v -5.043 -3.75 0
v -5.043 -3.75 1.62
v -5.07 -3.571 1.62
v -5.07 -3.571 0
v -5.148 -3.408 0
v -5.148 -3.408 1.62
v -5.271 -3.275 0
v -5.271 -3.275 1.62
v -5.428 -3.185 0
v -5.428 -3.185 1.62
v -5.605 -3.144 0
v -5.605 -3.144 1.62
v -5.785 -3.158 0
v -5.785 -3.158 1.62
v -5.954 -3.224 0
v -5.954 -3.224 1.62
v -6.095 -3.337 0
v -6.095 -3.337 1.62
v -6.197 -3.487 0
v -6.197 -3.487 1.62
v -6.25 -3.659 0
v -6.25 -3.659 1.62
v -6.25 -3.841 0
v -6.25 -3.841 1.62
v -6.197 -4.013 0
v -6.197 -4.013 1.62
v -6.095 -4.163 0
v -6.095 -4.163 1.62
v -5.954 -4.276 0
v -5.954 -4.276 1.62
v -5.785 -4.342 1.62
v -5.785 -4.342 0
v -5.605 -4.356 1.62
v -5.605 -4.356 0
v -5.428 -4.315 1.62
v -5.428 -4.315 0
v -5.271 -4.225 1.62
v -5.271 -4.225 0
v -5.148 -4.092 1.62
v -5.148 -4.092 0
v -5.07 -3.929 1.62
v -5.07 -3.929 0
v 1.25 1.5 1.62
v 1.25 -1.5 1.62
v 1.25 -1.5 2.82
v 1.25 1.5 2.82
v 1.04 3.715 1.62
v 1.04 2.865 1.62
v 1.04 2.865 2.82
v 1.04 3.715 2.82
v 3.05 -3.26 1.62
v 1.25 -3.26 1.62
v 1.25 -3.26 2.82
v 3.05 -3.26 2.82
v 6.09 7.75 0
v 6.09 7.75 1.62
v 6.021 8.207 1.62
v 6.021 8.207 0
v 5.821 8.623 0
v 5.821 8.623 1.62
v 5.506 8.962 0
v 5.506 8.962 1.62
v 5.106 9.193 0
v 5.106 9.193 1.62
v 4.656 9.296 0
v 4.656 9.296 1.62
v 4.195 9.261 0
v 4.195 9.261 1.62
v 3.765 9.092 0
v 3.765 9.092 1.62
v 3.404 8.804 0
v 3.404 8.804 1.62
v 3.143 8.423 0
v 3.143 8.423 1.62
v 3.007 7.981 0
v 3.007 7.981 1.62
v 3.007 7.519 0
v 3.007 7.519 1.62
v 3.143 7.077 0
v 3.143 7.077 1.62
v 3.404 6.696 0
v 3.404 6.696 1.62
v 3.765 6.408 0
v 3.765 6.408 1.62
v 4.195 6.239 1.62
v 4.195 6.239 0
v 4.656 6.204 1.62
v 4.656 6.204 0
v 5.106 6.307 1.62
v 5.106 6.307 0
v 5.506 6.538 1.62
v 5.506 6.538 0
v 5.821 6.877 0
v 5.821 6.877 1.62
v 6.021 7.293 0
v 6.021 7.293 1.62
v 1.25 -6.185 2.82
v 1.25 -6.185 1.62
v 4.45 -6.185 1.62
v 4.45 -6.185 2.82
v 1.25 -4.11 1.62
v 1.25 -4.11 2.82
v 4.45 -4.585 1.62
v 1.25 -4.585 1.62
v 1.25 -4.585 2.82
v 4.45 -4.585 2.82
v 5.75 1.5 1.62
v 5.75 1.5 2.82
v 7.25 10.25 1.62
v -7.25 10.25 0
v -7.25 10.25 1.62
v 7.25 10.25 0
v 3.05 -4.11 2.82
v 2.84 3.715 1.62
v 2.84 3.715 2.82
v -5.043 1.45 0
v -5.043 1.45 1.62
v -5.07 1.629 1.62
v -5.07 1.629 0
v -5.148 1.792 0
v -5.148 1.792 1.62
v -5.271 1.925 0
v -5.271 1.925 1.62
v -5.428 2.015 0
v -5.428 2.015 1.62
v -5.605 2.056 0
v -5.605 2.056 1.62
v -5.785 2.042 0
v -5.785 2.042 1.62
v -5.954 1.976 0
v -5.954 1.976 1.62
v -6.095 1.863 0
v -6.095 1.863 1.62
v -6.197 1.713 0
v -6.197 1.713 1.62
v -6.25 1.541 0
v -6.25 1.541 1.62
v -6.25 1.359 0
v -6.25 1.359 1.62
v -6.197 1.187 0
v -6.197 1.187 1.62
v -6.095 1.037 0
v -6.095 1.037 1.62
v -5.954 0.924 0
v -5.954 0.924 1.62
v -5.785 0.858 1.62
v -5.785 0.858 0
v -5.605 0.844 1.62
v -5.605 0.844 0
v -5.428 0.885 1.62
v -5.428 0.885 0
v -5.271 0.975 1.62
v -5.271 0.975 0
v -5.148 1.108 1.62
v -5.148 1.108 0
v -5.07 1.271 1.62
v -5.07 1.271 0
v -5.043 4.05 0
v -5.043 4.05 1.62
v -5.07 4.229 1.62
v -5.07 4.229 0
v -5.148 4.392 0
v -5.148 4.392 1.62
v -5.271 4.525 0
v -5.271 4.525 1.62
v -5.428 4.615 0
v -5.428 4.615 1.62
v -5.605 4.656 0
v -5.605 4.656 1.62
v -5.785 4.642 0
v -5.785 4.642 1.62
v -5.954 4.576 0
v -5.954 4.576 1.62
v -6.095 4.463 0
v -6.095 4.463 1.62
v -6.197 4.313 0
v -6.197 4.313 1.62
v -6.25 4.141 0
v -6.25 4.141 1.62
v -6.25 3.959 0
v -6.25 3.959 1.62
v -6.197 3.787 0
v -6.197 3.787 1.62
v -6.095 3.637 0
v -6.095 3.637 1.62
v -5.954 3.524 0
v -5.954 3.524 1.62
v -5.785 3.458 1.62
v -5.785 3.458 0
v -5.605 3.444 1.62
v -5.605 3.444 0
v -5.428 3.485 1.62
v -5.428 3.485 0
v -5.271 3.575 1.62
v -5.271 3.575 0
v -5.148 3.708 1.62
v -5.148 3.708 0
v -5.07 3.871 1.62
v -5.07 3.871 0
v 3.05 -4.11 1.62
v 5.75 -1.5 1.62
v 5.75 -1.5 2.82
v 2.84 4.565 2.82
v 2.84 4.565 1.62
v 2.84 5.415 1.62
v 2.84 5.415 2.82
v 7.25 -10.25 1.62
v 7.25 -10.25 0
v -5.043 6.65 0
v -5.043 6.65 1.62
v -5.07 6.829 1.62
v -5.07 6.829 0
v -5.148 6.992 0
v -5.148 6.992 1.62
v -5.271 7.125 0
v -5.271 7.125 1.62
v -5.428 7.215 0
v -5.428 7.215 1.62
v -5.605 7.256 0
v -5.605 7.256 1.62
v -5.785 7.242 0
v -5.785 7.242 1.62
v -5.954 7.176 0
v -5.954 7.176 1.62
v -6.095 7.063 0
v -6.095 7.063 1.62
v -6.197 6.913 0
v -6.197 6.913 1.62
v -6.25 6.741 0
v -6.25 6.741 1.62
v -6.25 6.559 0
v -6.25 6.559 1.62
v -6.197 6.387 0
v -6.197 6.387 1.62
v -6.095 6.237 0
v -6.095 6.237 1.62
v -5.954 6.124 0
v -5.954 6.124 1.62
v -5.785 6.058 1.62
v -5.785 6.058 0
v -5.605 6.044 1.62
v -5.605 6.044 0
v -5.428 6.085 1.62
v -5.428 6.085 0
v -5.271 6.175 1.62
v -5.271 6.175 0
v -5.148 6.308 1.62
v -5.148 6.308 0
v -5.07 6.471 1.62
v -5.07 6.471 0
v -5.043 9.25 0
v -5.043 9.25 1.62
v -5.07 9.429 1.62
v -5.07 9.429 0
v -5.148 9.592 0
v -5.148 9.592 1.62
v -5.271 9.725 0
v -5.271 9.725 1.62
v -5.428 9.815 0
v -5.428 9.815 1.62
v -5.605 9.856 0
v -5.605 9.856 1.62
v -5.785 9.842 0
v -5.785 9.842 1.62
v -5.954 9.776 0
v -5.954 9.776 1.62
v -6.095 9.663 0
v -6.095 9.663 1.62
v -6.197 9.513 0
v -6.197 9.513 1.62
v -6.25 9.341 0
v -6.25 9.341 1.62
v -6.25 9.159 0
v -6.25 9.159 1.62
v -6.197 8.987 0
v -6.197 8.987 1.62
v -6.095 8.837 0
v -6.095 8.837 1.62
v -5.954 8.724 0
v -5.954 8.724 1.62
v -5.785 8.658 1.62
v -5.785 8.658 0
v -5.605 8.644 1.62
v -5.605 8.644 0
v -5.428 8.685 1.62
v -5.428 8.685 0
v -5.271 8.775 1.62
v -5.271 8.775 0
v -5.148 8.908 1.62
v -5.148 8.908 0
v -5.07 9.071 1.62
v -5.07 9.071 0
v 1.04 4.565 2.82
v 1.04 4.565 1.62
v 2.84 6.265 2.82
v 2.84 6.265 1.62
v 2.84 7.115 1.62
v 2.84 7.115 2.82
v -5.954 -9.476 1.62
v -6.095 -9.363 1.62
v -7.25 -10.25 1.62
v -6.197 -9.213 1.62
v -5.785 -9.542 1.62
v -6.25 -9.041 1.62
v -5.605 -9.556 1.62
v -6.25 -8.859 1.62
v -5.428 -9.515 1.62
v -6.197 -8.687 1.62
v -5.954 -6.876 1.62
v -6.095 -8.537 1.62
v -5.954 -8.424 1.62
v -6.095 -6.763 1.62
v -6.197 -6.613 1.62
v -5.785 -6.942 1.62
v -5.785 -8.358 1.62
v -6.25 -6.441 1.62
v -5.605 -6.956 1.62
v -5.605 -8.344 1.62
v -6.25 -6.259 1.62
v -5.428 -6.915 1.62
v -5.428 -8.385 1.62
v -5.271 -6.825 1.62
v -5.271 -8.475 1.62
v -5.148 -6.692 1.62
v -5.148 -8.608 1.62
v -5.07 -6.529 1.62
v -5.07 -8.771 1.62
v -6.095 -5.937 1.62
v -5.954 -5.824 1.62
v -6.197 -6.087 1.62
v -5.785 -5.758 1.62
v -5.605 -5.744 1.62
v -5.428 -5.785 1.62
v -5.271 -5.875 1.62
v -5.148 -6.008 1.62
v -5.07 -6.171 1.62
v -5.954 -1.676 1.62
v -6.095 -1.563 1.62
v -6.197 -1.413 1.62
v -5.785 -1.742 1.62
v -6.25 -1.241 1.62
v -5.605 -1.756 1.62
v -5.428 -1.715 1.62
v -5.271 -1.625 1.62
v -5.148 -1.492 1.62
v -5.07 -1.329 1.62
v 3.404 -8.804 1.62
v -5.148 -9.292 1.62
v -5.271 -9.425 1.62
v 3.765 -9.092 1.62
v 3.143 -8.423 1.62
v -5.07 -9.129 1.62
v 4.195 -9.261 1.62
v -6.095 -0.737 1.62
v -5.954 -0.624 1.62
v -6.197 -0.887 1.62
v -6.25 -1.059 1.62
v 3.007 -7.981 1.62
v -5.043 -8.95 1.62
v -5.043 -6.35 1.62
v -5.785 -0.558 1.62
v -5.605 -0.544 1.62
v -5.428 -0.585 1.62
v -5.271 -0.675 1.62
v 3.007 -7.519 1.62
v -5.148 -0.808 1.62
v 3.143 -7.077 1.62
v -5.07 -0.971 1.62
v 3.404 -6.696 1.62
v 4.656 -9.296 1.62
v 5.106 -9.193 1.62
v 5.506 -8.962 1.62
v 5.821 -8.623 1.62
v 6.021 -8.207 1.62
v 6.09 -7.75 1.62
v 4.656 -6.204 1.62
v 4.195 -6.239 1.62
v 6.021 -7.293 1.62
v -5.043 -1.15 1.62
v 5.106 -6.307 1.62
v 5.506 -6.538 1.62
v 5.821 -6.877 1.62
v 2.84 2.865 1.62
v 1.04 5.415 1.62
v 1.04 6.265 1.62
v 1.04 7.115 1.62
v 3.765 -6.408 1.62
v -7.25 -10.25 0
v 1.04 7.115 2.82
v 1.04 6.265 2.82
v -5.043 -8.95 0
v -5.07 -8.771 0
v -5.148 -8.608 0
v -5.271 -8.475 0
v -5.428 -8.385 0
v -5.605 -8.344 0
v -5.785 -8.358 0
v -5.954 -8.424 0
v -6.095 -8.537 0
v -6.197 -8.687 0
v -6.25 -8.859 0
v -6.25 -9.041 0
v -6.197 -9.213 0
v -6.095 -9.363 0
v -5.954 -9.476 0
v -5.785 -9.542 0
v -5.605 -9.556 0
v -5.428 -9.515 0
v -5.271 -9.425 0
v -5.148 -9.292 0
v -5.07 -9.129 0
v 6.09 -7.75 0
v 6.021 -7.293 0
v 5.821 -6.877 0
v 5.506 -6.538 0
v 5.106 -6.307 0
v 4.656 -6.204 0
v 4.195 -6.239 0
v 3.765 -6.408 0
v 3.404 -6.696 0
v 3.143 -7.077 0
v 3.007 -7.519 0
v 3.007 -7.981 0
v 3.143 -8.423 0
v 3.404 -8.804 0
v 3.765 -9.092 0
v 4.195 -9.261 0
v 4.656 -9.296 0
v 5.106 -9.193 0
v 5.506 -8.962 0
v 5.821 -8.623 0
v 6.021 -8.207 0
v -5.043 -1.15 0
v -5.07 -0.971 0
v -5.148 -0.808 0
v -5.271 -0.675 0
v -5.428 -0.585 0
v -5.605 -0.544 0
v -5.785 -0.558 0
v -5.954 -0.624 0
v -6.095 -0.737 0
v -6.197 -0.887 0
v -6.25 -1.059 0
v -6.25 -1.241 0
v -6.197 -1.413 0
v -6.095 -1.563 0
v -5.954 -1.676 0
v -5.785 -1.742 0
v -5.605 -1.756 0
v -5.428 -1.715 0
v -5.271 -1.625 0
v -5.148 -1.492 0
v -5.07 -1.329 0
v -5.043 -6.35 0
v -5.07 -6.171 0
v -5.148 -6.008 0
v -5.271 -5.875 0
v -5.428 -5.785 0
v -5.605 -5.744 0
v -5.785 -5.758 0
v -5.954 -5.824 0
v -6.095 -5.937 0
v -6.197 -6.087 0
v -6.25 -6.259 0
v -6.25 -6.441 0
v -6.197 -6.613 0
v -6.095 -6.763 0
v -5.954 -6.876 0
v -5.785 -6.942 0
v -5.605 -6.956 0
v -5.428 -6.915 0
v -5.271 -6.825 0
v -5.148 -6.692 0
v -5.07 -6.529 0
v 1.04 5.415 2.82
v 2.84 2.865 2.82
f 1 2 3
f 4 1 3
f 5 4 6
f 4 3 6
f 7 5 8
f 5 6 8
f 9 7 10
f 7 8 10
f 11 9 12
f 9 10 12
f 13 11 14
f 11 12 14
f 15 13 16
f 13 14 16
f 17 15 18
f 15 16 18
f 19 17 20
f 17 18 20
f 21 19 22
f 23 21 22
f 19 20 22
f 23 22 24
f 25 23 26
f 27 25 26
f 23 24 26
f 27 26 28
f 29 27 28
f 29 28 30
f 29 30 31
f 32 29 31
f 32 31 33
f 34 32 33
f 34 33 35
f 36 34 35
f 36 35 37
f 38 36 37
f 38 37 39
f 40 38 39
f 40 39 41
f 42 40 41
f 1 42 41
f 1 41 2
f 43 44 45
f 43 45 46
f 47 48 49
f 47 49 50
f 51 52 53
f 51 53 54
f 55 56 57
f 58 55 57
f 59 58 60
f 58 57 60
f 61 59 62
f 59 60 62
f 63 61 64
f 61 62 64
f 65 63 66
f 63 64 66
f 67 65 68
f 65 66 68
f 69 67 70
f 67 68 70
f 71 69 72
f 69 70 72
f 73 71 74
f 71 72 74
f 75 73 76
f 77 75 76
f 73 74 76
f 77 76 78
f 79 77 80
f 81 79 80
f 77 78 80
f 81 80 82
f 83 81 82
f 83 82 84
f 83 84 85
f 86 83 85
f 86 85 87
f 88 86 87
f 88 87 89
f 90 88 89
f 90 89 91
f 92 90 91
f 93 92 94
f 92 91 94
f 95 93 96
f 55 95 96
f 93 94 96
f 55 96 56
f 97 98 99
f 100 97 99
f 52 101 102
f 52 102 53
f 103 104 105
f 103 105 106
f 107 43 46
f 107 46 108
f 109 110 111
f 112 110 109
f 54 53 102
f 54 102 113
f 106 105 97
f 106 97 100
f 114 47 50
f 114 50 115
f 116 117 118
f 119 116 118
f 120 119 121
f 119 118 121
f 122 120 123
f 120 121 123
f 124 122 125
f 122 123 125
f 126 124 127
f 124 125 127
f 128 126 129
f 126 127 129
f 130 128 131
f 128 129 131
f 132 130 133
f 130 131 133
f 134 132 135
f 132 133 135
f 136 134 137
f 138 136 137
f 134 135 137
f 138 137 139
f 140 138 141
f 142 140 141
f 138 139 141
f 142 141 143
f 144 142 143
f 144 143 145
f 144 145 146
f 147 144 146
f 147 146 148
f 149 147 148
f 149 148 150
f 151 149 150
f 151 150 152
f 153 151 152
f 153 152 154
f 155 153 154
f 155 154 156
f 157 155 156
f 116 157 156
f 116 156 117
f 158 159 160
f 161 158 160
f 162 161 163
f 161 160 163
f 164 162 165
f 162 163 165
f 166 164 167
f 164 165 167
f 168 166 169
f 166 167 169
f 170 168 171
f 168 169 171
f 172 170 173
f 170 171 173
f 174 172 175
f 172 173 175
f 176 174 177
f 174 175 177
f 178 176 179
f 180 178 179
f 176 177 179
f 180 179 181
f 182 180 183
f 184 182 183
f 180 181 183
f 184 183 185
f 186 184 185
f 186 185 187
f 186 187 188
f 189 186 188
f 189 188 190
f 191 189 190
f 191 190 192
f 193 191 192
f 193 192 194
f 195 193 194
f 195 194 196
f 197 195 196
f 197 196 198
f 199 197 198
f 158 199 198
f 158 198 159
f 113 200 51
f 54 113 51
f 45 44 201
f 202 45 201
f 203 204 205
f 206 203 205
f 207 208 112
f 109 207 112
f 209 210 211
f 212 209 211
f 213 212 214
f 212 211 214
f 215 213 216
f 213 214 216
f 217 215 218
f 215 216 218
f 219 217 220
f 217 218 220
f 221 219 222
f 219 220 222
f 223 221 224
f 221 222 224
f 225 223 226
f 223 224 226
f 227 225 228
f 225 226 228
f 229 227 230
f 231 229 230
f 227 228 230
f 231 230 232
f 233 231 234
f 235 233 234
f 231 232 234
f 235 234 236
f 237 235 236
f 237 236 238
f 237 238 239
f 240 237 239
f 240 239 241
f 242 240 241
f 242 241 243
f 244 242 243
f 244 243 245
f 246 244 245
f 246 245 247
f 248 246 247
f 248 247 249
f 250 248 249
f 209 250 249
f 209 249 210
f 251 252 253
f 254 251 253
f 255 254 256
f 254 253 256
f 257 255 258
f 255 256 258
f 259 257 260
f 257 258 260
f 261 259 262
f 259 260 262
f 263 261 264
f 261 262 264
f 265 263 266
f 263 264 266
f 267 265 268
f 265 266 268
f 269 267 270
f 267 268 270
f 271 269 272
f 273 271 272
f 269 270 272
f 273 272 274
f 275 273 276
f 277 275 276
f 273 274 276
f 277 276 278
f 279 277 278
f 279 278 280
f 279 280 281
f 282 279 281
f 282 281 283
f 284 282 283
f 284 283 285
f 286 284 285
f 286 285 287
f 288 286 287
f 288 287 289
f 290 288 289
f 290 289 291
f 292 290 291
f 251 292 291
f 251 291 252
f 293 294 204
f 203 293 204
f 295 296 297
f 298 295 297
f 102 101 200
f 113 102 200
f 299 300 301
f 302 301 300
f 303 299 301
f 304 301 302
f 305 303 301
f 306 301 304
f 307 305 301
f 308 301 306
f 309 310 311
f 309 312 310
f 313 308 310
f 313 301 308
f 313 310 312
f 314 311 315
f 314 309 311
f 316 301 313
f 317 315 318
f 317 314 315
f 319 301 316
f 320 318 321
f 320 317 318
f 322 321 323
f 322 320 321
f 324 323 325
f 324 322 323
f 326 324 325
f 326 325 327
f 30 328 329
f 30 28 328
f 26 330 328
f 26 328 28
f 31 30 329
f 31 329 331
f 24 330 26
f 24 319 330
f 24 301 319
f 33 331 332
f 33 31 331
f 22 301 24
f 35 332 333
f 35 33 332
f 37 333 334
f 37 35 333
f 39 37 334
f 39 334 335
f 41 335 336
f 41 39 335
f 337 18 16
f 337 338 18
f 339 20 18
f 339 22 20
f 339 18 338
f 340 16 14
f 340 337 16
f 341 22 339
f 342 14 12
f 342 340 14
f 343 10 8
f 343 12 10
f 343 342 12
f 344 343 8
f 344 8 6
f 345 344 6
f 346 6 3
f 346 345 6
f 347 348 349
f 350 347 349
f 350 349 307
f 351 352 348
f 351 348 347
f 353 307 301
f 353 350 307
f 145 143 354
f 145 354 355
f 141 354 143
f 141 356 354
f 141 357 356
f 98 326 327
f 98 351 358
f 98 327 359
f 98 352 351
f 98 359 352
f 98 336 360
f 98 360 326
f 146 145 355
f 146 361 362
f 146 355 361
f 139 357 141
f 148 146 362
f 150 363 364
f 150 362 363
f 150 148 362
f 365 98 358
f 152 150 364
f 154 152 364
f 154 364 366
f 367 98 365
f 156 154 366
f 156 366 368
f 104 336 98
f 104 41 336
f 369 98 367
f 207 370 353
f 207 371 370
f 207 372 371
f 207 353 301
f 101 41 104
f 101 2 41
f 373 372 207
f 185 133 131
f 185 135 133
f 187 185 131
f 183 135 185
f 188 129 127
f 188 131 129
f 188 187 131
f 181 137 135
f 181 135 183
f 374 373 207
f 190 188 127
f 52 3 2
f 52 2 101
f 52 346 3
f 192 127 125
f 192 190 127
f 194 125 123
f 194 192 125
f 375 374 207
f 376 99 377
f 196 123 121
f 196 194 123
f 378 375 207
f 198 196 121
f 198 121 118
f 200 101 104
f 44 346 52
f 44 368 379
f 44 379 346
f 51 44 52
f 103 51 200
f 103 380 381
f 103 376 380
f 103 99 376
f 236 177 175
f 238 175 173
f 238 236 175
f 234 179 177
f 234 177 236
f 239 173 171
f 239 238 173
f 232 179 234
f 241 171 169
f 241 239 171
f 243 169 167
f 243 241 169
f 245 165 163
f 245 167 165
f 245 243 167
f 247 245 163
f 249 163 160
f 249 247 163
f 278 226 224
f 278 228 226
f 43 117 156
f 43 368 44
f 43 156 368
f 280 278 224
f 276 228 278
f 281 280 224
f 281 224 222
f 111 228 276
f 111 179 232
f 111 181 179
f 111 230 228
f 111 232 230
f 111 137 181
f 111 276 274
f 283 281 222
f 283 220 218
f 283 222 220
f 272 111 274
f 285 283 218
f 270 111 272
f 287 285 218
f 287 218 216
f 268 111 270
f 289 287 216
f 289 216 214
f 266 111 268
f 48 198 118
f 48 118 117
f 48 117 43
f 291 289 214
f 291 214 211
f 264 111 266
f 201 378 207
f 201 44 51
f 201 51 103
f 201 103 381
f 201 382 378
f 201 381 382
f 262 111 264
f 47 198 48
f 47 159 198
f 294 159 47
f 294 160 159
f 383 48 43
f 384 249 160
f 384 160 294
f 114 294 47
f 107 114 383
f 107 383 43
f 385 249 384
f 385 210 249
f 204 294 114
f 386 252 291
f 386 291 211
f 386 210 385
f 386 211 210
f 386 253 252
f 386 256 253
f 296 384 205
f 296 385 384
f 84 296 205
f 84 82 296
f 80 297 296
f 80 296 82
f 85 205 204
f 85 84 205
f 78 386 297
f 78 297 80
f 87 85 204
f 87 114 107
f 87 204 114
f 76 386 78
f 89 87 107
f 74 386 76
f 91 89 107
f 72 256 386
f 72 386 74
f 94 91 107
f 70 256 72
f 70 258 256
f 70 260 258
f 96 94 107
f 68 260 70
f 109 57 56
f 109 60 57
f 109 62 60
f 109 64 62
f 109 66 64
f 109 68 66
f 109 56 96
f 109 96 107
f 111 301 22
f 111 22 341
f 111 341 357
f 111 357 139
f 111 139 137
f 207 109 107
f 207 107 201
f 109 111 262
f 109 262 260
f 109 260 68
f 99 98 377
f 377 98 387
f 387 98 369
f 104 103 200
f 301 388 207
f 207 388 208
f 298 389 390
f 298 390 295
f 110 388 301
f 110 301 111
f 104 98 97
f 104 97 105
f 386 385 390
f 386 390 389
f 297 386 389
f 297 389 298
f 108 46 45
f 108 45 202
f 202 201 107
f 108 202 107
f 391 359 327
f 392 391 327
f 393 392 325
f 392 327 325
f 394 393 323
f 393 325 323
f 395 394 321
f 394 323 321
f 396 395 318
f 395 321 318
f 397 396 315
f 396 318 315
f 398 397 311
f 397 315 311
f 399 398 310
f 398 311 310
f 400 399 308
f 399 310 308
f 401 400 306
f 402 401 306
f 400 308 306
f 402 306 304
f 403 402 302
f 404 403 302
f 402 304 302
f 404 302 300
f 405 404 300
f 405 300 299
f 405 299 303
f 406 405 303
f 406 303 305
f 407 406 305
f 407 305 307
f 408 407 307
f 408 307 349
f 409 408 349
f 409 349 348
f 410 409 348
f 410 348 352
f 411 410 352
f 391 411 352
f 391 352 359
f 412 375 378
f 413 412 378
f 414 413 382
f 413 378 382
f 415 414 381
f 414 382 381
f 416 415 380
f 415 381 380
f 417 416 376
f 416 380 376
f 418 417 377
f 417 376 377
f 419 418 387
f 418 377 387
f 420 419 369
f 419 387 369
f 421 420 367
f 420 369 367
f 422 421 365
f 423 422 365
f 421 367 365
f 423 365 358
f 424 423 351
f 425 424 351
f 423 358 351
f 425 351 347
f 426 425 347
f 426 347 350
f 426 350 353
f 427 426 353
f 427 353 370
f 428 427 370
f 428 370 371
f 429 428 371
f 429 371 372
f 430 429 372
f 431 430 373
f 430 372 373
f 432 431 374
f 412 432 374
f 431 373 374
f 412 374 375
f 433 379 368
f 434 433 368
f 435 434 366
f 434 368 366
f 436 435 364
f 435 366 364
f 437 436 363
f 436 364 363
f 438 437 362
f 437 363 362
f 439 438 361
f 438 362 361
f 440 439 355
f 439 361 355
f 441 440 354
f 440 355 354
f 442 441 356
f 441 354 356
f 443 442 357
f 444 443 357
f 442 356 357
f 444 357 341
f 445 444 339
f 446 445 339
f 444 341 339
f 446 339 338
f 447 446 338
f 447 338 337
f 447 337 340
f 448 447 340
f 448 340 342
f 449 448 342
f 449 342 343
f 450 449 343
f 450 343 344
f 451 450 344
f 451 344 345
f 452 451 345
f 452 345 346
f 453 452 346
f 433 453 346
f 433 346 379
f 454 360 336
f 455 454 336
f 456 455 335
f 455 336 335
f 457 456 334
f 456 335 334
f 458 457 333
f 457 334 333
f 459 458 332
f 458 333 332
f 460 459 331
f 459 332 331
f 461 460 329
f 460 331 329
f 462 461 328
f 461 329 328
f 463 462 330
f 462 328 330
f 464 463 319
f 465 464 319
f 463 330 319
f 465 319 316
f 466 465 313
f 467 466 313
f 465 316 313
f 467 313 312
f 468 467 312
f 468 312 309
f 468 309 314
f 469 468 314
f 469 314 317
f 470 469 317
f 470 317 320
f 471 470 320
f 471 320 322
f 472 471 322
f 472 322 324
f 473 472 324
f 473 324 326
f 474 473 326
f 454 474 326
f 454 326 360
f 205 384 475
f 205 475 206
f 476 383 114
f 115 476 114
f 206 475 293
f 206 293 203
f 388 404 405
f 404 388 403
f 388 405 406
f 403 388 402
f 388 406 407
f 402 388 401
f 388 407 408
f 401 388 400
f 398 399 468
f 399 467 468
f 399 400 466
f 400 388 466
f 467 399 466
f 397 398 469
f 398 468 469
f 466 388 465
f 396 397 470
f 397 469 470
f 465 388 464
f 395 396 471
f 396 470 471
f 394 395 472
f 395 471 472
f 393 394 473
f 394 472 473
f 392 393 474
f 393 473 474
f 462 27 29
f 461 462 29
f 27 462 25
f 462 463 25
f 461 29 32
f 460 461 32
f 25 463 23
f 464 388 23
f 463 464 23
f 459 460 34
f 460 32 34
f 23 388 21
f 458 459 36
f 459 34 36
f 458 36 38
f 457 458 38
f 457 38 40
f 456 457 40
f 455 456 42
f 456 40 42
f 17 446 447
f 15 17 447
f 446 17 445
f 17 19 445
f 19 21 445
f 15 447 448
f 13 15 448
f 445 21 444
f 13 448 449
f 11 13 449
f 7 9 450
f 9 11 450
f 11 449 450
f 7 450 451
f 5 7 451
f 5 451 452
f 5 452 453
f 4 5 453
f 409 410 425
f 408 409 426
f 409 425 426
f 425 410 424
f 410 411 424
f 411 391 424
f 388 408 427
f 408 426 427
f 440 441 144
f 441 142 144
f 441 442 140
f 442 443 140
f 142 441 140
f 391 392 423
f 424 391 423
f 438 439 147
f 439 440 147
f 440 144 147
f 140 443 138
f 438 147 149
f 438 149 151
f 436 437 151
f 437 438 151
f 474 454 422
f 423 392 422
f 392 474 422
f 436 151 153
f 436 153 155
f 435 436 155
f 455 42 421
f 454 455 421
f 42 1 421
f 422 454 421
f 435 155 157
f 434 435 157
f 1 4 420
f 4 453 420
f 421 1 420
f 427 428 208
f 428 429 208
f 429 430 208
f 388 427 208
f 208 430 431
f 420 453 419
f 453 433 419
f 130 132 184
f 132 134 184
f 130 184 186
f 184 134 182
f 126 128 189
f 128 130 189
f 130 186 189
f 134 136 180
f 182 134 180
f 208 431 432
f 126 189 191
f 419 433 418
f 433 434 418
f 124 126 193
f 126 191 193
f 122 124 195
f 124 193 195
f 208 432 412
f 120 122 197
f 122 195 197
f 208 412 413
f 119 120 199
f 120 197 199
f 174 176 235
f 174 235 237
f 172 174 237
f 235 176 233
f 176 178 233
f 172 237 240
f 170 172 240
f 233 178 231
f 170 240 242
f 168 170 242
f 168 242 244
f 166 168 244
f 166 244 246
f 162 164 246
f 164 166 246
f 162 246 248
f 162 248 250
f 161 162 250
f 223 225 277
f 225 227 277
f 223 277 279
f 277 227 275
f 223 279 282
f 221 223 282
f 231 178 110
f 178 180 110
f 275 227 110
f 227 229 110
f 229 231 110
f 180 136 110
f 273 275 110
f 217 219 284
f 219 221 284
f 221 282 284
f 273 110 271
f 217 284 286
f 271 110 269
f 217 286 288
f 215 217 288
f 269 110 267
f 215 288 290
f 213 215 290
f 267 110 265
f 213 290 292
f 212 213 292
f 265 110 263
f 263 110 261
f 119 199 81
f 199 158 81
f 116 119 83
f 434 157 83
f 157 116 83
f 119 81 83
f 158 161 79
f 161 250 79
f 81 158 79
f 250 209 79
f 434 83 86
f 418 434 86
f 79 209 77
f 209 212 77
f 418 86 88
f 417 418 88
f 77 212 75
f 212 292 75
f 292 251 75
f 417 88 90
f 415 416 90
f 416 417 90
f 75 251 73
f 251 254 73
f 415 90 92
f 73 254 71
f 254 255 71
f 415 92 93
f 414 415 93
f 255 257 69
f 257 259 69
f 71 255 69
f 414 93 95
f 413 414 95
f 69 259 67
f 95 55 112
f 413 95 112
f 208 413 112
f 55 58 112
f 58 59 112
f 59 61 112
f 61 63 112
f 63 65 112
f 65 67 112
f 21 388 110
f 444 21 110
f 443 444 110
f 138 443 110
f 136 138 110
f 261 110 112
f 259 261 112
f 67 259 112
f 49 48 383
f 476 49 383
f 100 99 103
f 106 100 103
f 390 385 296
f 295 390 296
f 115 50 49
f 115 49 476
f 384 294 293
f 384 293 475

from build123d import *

# Parameters (mm, degrees)
SKETCH1_W           = 14.5
SKETCH1_H           = 20.5
BOSS_EXTRUDE1_DEPTH = 1.62
SKETCH2_R           = 1.55
CUT_EXTRUDE1_DEPTH  = 1.62
SKETCH3_W           = 1.8
SKETCH3_H           = 0.85
SKETCH3_W_2         = 4.5
SKETCH3_H_2         = 3
SKETCH3_W_3         = 3.2
SKETCH3_H_3         = 1.6
BOSS_EXTRUDE2_DEPTH = 1.2
SKETCH4_R           = 0.607226872
CUT_EXTRUDE2_DEPTH  = 13.658965203


with BuildPart() as part:
    # Sketch1 → Boss-Extrude1 (new body)
    with BuildSketch(Plane.XY):
        Rectangle(SKETCH1_W, SKETCH1_H)
    extrude(amount=BOSS_EXTRUDE1_DEPTH)

    # Sketch2 → Cut-Extrude1 (cut)
    with BuildSketch(Plane.XY.offset(1.62)):
        with Locations((4.54, 7.75)):
            Circle(SKETCH2_R)
        with Locations((4.54, -7.75)):
            Circle(SKETCH2_R)
    extrude(amount=-CUT_EXTRUDE1_DEPTH, mode=Mode.SUBTRACT)

    # Sketch3 → Boss-Extrude2 (add)
    with BuildSketch(Plane.XY.offset(1.62)):
        with Locations((1.94, 6.69017984)):
            Rectangle(SKETCH3_W, SKETCH3_H)
        with Locations((1.94, 4.99017984)):
            Rectangle(SKETCH3_W, SKETCH3_H)
        with Locations((1.94, 3.29017984)):
            Rectangle(SKETCH3_W, SKETCH3_H)
        with Locations((3.5, 0)):
            Rectangle(SKETCH3_W_2, SKETCH3_H_2)
        with Locations((2.15, -3.68482016)):
            Rectangle(SKETCH3_W, SKETCH3_H)
        with Locations((2.85, -5.38482016)):
            Rectangle(SKETCH3_W_3, SKETCH3_H_3)
    extrude(amount=BOSS_EXTRUDE2_DEPTH)

    # Sketch4 → Cut-Extrude2 (cut, through all)
    with BuildSketch(Plane.XY.offset(1.62)):
        with Locations((-5.65, 9.25)):
            Circle(SKETCH4_R)
        with Locations((-5.65, 6.65)):
            Circle(SKETCH4_R)
        with Locations((-5.65, 4.05)):
            Circle(SKETCH4_R)
        with Locations((-5.65, 1.45)):
            Circle(SKETCH4_R)
        with Locations((-5.65, -1.15)):
            Circle(SKETCH4_R)
        with Locations((-5.65, -3.75)):
            Circle(SKETCH4_R)
        with Locations((-5.65, -6.35)):
            Circle(SKETCH4_R)
        with Locations((-5.65, -8.95)):
            Circle(SKETCH4_R)
        with Locations((-5.65, -11.55)):
            Circle(SKETCH4_R)
        with Locations((-5.65, -14.15)):
            Circle(SKETCH4_R)
    extrude(amount=-CUT_EXTRUDE2_DEPTH, mode=Mode.SUBTRACT)


solid = part.part
